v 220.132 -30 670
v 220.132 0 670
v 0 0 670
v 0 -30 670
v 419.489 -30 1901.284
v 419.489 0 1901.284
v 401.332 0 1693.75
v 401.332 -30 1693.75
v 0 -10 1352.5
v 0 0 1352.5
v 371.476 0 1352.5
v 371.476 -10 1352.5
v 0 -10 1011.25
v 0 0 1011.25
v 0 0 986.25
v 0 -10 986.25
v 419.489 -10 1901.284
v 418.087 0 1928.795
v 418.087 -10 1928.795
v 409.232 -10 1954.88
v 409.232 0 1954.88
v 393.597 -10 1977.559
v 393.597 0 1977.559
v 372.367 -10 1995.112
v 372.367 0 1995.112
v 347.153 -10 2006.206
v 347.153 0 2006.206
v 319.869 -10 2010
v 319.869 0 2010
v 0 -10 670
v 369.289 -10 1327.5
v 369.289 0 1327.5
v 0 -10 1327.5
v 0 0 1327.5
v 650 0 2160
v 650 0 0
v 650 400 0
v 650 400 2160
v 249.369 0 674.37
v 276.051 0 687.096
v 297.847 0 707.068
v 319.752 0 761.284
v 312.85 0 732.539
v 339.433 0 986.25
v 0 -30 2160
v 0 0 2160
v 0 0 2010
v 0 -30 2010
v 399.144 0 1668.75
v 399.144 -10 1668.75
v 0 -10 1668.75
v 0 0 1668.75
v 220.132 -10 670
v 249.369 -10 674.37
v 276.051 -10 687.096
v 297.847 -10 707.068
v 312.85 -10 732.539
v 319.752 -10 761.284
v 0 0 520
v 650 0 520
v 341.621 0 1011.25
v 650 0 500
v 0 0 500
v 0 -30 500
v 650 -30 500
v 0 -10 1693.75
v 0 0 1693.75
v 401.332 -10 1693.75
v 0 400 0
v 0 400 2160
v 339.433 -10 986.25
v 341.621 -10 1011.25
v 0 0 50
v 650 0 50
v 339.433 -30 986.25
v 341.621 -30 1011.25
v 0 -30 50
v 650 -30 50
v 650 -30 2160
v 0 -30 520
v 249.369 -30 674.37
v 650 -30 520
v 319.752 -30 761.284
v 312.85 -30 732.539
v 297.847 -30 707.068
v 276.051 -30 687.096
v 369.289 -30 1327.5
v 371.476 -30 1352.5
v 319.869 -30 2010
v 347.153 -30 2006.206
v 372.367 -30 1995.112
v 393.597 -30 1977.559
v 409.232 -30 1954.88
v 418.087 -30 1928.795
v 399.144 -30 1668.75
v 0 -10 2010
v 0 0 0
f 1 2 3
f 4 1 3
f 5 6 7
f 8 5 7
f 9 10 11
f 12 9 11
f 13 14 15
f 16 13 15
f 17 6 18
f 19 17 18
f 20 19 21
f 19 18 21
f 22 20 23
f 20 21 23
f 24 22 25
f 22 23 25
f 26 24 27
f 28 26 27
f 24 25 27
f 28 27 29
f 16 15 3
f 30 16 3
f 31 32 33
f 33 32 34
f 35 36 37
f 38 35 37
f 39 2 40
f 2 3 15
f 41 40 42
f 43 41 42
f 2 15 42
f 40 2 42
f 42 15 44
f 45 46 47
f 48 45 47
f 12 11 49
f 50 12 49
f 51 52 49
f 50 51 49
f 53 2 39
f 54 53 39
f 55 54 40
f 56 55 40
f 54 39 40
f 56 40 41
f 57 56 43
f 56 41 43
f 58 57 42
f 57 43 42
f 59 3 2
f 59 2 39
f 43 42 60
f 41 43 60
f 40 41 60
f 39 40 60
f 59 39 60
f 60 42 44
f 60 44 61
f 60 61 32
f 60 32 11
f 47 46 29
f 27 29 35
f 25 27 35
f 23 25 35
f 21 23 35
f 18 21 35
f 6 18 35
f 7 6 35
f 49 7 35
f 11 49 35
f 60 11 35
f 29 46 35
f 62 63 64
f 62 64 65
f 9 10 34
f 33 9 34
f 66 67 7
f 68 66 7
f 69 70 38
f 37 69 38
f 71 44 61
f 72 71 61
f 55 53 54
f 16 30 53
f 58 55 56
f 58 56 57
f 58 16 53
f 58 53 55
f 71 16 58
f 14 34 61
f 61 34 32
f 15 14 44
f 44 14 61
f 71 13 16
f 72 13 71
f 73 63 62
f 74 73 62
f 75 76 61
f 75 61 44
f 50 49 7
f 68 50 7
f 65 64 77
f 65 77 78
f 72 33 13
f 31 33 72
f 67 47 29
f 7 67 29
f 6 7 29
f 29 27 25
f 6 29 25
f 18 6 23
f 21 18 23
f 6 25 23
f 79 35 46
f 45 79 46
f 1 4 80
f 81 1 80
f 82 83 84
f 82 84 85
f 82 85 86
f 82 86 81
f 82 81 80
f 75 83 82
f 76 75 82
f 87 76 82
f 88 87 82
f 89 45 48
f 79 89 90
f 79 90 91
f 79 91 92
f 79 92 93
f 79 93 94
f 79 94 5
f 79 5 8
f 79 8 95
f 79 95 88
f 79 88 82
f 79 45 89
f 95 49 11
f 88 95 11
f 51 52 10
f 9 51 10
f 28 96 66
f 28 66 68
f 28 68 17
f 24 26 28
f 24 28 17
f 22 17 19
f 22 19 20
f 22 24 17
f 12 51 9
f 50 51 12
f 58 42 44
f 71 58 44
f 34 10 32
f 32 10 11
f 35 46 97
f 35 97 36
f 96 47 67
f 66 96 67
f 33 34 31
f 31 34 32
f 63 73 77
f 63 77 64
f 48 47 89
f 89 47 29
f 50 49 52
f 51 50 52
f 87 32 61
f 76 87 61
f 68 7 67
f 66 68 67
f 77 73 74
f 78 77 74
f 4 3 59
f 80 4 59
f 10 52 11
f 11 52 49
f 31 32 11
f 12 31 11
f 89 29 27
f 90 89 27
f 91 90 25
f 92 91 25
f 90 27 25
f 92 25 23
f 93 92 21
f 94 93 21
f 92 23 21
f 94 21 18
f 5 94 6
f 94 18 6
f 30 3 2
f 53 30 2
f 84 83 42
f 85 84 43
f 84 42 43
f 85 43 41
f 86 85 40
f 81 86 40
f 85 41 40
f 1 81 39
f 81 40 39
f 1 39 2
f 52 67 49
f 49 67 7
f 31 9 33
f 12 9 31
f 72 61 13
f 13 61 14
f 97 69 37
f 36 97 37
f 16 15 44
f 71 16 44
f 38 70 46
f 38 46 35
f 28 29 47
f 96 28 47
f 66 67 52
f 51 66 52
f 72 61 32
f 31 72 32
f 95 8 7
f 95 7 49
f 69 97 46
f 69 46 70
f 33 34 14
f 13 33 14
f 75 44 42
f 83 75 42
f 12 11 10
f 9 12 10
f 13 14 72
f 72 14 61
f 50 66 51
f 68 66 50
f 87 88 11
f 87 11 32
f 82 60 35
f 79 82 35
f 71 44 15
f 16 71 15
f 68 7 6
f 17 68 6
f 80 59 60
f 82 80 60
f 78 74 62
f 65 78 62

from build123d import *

# Parameters (mm, degrees)
F1_W     = 650
F1_H     = 400
F2_DEPTH = 2160
F3_W     = 650
F3_H     = 450
F4_DEPTH = 30
F5_DEPTH = 10
F6_DEPTH = 10


with BuildPart() as f2:
    # F1 (on Top) → F2 (new body)
    with BuildSketch(Plane.XY):
        with Locations((325, 200)):
            Rectangle(F1_W, F1_H)
    extrude(amount=F2_DEPTH)


with BuildPart() as f4:
    # F3 (on face) → F4 (new body)
    with BuildSketch(Plane.XZ):
        with Locations((325, 275)):
            Rectangle(F3_W, F3_H)
    extrude(amount=F4_DEPTH)


with BuildPart() as f4b:
    # F3 (on face) → F4, piece 2 (new body)
    with BuildSketch(Plane.XZ):
        with BuildLine():
            Line((0, 670), (0, 520))
            Line((0, 520), (650, 520))
            Line((650, 520), (650, 2160))
            Line((650, 2160), (0, 2160))
            Line((0, 2160), (0, 2010))
            Line((0, 2010), (319.8691498931, 2010))
            ThreePointArc((319.8691498931, 2010), (393.5968835741, 1977.5590207616), (419.4886197022, 1901.2844257252))
            Line((419.4886197022, 1901.2844257252), (401.3317101599, 1693.75))
            Line((401.3317101599, 1693.75), (399.1444935718, 1668.75))
            Line((399.1444935718, 1668.75), (371.4762037317, 1352.5))
            Line((371.4762037317, 1352.5), (369.2889871436, 1327.5))
            Line((369.2889871436, 1327.5), (341.6206973035, 1011.25))
            Line((341.6206973035, 1011.25), (339.4334807153, 986.25))
            Line((339.4334807153, 986.25), (319.7515432827, 761.2844257252))
            ThreePointArc((319.7515432827, 761.2844257252), (287.6910942351, 696.272266319), (220.1320734735, 670))
            Line((220.1320734735, 670), (0, 670))
        make_face()
    extrude(amount=F4_DEPTH)


with BuildPart() as f5:
    # F3 (on face) → F5 (new body)
    with BuildSketch(Plane.XZ):
        with BuildLine():
            Line((319.8691498931, 2010), (0, 2010))
            Line((0, 2010), (0, 1693.75))
            Line((0, 1693.75), (401.3317101599, 1693.75))
            Line((401.3317101599, 1693.75), (419.4886197022, 1901.2844257252))
            ThreePointArc((419.4886197022, 1901.2844257252), (393.5968835741, 1977.5590207616), (319.8691498931, 2010))
        make_face()
    extrude(amount=F5_DEPTH)


with BuildPart() as f5b:
    # F3 (on face) → F5, piece 2 (new body)
    with BuildSketch(Plane.XZ):
        Polygon((0, 1668.75), (0, 1352.5), (371.4762037317, 1352.5), (399.1444935718, 1668.75), align=None)
    extrude(amount=F5_DEPTH)


with BuildPart() as f5c:
    # F3 (on face) → F5, piece 3 (new body)
    with BuildSketch(Plane.XZ):
        Polygon((0, 1327.5), (0, 1011.25), (341.6206973035, 1011.25), (369.2889871436, 1327.5), align=None)
    extrude(amount=F5_DEPTH)


with BuildPart() as f5d:
    # F3 (on face) → F5, piece 4 (new body)
    with BuildSketch(Plane.XZ):
        with BuildLine():
            Line((0, 986.25), (0, 670))
            Line((0, 670), (220.1320734735, 670))
            ThreePointArc((220.1320734735, 670), (287.6910942351, 696.272266319), (319.7515432827, 761.2844257252))
            Line((319.7515432827, 761.2844257252), (339.4334807153, 986.25))
            Line((339.4334807153, 986.25), (0, 986.25))
        make_face()
    extrude(amount=F5_DEPTH)


with BuildPart() as f6:
    # F3 (on face) → F6 (new body)
    with BuildSketch(Plane.XZ):
        Polygon((401.3317101599, 1693.75), (0, 1693.75), (0, 1668.75), (399.1444935718, 1668.75), align=None)
    extrude(amount=F6_DEPTH)


with BuildPart() as f6b:
    # F3 (on face) → F6, piece 2 (new body)
    with BuildSketch(Plane.XZ):
        Polygon((0, 1352.5), (0, 1327.5), (369.2889871436, 1327.5), (371.4762037317, 1352.5), align=None)
    extrude(amount=F6_DEPTH)


with BuildPart() as f6c:
    # F3 (on face) → F6, piece 3 (new body)
    with BuildSketch(Plane.XZ):
        Polygon((0, 1011.25), (0, 986.25), (339.4334807153, 986.25), (341.6206973035, 1011.25), align=None)
    extrude(amount=F6_DEPTH)


solid = Compound([f2.part, f4.part, f4b.part, f5.part, f5b.part, f5c.part, f5d.part, f6.part, f6b.part, f6c.part])
